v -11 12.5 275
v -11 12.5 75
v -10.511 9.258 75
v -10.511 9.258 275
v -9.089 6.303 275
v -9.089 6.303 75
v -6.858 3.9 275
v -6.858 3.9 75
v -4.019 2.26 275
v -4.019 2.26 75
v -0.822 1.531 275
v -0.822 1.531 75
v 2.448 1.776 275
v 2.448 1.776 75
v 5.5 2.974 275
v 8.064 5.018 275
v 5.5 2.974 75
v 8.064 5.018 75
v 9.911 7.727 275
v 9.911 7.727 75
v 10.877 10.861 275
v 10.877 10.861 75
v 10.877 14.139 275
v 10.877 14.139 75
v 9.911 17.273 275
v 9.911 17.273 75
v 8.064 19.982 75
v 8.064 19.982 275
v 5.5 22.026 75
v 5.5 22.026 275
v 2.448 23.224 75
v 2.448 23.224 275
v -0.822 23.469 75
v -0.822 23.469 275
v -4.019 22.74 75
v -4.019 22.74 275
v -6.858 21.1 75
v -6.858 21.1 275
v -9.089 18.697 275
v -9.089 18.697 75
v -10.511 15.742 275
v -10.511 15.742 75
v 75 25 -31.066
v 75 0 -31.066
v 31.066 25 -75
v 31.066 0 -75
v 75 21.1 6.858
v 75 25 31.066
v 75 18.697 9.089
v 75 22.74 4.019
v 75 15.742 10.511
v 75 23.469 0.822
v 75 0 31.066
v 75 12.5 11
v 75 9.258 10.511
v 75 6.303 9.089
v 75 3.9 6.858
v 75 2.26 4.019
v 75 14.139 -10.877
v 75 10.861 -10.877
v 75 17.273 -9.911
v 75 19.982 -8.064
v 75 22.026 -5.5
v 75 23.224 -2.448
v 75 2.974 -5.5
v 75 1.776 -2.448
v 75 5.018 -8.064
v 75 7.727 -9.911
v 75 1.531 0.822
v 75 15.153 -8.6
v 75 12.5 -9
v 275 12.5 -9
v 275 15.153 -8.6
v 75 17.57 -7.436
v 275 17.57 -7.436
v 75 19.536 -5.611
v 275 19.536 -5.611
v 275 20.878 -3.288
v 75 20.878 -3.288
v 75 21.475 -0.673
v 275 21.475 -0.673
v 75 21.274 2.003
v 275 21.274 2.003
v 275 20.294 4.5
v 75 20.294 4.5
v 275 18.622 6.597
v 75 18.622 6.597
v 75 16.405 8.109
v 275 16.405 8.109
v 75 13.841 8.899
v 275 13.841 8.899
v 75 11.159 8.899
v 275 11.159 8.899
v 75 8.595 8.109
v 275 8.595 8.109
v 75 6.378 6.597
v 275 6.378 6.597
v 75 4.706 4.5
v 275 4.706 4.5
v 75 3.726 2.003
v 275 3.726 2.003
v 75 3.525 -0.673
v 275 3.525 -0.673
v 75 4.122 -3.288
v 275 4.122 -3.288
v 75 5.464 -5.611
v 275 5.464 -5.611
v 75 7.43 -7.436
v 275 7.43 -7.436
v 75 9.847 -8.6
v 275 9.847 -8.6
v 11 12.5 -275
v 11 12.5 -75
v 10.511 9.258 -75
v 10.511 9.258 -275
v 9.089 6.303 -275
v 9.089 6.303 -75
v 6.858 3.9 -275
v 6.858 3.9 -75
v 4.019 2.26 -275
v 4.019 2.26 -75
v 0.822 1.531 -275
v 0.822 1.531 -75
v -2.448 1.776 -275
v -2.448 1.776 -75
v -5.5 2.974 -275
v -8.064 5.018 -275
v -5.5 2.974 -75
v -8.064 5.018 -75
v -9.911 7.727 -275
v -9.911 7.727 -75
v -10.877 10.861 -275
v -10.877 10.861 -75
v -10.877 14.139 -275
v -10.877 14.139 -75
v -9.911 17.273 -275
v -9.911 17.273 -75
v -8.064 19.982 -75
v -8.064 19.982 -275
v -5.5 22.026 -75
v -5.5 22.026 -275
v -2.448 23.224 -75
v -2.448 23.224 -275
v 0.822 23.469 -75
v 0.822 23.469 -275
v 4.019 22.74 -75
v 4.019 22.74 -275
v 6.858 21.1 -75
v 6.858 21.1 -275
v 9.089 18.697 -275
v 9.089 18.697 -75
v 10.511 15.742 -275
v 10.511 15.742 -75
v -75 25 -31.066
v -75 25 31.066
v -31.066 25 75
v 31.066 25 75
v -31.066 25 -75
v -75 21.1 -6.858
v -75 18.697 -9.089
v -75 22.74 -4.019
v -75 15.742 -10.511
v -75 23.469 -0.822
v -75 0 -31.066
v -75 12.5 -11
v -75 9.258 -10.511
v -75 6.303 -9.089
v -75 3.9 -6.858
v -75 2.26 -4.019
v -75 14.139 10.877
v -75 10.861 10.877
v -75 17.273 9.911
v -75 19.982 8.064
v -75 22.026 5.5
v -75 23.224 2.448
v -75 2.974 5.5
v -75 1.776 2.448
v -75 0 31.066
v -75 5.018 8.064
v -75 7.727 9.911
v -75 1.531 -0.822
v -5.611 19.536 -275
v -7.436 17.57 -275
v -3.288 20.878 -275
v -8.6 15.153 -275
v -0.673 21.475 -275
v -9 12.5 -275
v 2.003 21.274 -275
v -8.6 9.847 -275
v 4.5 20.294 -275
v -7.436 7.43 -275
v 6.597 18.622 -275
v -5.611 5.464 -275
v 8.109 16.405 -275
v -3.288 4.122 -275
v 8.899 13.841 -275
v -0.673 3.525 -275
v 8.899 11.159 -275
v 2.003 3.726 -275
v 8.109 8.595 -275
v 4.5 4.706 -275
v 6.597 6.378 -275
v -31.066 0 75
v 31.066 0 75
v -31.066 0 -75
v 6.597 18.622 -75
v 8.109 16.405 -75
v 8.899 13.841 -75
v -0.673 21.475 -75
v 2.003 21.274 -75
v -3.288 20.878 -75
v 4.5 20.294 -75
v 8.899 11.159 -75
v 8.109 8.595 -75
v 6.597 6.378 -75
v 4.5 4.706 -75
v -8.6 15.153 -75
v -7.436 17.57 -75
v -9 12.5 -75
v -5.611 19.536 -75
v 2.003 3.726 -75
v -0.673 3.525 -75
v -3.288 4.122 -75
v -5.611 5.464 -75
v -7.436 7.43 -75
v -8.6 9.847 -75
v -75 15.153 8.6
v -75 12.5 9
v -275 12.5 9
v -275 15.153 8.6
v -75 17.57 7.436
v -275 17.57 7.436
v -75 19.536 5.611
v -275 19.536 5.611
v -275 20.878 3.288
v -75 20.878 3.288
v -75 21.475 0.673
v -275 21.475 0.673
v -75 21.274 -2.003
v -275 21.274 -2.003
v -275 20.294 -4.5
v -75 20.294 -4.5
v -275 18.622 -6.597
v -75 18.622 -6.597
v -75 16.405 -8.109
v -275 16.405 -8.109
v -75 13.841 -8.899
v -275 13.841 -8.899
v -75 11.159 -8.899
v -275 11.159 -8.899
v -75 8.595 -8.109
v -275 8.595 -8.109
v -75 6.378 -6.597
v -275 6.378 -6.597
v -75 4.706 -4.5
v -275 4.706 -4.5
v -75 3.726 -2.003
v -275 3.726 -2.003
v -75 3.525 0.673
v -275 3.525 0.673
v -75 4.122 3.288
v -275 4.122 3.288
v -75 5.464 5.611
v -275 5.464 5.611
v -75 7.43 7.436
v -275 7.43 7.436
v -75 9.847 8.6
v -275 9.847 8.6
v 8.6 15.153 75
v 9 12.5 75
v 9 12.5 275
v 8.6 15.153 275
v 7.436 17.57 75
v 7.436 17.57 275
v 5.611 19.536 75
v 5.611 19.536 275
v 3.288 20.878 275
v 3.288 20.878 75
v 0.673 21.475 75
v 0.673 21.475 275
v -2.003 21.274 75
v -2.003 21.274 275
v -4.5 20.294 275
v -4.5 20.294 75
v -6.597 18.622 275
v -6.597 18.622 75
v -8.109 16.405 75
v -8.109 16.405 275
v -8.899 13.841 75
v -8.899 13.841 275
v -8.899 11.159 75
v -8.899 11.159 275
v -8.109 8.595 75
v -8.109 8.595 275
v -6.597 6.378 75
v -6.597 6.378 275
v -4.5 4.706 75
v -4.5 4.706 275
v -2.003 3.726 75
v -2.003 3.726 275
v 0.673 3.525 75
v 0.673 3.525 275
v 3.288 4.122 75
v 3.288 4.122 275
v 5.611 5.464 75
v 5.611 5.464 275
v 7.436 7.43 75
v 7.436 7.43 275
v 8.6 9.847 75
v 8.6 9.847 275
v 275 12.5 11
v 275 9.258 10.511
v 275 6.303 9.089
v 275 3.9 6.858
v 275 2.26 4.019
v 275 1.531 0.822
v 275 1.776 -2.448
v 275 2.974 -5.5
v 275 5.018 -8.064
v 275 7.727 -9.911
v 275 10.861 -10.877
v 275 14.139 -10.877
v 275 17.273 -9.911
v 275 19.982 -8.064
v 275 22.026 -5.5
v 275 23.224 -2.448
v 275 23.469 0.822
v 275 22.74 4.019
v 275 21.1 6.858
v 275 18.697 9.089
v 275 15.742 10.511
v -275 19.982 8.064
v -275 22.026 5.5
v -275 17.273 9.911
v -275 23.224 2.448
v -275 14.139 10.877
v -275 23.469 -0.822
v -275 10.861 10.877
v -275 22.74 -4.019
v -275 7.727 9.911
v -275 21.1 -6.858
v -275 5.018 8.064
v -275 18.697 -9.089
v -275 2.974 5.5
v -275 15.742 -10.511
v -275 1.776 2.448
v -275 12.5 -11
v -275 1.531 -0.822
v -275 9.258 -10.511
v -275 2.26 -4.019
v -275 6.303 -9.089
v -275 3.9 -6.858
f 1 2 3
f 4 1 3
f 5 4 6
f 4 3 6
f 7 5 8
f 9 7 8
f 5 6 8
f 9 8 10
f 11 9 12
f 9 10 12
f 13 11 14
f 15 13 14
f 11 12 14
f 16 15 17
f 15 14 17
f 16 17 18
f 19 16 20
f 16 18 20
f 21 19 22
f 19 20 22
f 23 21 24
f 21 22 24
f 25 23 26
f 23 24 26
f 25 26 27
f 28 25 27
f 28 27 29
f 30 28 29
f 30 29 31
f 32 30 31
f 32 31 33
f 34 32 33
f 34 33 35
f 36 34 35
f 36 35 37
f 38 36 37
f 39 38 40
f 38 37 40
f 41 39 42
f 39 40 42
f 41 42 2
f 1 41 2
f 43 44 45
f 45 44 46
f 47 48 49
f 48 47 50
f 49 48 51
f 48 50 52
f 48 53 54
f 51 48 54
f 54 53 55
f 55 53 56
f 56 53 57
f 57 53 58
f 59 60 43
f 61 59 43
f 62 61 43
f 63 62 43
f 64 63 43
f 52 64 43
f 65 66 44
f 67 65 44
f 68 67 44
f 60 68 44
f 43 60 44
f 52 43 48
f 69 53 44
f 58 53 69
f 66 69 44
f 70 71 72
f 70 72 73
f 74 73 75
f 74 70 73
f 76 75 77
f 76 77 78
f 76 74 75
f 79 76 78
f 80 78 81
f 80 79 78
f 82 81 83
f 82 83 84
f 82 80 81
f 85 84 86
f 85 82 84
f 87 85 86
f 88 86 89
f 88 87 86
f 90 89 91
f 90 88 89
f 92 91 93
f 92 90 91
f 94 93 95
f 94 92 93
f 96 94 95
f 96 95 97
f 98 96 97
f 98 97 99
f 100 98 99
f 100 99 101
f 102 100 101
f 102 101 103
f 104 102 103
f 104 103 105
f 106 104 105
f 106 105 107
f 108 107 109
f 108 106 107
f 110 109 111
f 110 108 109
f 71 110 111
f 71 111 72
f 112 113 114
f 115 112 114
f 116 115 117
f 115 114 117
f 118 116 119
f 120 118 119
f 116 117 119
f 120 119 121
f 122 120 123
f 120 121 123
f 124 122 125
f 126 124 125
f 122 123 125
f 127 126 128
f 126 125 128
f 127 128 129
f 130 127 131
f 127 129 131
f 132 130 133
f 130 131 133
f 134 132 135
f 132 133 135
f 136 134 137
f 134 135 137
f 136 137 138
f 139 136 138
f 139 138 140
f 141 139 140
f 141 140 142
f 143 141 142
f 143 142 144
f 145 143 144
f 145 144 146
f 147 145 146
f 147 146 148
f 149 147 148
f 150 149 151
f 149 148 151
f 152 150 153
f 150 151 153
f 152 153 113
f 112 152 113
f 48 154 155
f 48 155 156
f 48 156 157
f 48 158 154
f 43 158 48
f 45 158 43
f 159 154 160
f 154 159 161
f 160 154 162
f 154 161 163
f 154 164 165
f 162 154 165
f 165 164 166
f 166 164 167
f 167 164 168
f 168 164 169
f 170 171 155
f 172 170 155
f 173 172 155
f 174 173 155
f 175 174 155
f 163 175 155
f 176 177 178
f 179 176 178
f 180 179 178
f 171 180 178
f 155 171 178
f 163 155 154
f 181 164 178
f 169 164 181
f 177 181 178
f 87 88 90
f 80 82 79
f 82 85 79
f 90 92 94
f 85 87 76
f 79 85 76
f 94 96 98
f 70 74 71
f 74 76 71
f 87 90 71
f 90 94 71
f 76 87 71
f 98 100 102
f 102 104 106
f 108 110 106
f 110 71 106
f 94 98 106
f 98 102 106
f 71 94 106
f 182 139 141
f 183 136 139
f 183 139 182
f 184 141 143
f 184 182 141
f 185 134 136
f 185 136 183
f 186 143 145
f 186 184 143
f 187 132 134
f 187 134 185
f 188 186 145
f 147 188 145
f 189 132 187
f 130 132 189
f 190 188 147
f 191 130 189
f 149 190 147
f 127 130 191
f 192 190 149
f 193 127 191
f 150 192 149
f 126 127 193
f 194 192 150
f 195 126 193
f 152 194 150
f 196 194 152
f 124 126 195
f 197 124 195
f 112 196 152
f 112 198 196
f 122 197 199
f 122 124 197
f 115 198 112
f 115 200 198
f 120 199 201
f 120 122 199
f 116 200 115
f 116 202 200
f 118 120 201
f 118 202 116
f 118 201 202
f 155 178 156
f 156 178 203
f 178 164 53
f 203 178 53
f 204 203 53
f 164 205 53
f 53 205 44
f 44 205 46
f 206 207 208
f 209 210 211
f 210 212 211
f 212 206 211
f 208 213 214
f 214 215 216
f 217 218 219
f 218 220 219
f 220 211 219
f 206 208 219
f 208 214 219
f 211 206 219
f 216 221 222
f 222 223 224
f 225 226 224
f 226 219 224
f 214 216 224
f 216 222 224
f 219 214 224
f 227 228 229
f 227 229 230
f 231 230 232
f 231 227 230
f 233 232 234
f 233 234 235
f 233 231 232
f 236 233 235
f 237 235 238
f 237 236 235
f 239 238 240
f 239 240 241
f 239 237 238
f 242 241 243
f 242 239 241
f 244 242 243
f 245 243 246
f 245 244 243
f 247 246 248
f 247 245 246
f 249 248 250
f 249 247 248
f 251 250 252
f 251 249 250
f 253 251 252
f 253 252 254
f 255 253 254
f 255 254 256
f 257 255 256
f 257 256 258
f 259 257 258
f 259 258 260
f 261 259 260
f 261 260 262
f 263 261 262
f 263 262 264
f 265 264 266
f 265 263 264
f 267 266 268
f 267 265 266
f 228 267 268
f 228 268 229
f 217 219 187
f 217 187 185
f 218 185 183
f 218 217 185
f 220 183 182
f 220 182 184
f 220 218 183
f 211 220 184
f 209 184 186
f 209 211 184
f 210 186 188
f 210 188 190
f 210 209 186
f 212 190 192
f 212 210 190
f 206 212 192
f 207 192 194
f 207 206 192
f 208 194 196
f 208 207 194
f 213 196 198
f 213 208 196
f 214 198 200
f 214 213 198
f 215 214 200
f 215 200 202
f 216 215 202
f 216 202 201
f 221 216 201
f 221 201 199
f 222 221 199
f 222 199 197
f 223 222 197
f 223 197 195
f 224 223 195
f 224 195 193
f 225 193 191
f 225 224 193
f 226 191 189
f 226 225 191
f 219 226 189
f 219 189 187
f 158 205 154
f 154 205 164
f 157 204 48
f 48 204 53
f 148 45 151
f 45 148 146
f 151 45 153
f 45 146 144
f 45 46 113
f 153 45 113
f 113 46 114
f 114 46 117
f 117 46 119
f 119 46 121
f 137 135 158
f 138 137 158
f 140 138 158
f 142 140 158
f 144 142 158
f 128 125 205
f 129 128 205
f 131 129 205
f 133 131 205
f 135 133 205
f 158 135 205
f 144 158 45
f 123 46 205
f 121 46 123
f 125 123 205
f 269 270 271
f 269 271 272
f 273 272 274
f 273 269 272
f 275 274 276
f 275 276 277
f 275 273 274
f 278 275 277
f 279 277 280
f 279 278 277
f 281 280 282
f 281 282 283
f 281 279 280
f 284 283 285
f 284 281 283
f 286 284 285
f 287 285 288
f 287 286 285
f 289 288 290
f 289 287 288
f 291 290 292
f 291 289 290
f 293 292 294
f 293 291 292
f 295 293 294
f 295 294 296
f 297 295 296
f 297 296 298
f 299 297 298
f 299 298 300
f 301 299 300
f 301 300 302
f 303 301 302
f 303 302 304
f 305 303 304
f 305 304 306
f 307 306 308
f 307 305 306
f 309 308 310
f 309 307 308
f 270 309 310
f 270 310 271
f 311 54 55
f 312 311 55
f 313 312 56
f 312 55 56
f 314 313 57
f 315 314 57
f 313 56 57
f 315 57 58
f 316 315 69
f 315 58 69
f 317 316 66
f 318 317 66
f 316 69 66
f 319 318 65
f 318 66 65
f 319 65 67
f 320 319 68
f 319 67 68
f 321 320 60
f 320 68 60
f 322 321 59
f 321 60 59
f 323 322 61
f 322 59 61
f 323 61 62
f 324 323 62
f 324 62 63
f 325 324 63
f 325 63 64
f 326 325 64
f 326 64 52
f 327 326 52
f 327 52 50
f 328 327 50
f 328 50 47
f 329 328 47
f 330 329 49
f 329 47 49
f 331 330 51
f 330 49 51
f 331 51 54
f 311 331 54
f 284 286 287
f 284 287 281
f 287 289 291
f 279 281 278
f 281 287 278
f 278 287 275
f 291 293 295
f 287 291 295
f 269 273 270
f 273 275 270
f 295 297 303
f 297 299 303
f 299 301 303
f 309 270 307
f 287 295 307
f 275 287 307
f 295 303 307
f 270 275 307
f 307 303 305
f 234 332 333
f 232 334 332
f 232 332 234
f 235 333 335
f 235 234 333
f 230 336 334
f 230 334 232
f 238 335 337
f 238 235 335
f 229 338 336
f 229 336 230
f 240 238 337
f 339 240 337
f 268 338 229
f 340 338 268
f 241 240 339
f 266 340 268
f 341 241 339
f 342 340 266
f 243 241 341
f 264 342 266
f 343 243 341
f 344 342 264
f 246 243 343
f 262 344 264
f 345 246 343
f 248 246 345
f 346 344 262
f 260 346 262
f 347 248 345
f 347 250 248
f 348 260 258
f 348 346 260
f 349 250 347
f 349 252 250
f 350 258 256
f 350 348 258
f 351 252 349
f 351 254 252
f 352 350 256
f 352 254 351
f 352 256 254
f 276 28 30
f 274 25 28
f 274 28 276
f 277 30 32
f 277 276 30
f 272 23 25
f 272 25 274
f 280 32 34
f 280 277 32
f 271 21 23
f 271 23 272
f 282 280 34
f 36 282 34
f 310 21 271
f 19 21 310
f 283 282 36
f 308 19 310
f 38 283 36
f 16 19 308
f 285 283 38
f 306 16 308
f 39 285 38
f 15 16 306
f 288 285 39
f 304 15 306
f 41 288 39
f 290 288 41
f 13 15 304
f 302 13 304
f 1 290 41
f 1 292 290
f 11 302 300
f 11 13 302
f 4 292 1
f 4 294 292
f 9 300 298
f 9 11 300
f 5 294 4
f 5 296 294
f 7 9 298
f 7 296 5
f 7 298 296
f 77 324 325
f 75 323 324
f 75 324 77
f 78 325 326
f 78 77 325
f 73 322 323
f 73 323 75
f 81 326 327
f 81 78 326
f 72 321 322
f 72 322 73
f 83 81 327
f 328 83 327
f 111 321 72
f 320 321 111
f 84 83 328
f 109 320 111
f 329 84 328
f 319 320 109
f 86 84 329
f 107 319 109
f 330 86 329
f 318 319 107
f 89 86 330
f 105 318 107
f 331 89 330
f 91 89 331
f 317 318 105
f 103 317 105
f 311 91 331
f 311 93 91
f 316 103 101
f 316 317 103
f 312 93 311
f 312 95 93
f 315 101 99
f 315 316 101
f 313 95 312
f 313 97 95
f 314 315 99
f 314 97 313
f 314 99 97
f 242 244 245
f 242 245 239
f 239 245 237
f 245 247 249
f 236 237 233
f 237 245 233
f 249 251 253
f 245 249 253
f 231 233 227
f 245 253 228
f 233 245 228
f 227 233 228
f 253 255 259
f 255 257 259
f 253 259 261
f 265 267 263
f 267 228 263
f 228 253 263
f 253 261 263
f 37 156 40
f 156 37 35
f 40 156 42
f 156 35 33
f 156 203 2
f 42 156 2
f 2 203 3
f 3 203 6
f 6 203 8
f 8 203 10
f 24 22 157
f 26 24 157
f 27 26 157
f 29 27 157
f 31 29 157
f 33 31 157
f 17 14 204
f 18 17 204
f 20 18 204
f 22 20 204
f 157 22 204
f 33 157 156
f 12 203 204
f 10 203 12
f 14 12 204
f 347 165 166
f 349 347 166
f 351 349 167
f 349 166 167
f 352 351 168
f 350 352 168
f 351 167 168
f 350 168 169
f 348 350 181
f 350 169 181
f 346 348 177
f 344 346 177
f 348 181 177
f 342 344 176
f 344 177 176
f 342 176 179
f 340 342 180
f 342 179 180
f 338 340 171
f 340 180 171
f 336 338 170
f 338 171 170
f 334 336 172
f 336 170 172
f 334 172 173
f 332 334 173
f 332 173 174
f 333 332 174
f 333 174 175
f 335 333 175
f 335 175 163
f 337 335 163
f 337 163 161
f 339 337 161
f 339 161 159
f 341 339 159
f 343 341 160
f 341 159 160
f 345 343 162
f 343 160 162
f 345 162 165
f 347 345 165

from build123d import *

# Parameters (mm, degrees)
BOSS_EXTRUDE1_DEPTH = 25
SKETCH2_R           = 11
SKETCH2_R_2         = 9
BOSS_EXTRUDE2_DEPTH = 200
CIRPATTERN1_COUNT   = 4


with BuildPart() as part:
    # Sketch1 → Boss-Extrude1 (new body)
    with BuildSketch(Plane(origin=(0, 0, 0), x_dir=(1, 0, 0), z_dir=(0, 1, 0))):
        Polygon((-75, 31.066017178), (-75, -31.066017178), (-31.066017178, -75), (31.066017178, -75), (75, -31.066017178), (75, 31.066017178), (31.066017178, 75), (-31.066017178, 75), align=None)
    extrude(amount=BOSS_EXTRUDE1_DEPTH)

    # Sketch2 → Boss-Extrude2 (add)
    with BuildSketch(Plane.ZY.offset(75)):
        with Locations((0, 12.5)):
            Circle(SKETCH2_R)
        with Locations((0, 12.5)):
            Circle(SKETCH2_R_2, mode=Mode.SUBTRACT)
    boss_extrude2 = extrude(amount=BOSS_EXTRUDE2_DEPTH)

    # CirPattern1: Boss-Extrude2 ×4 about axis
    cirpattern1_axis = Axis((0, 0, 0), (0, 1, 0))
    for i in range(1, CIRPATTERN1_COUNT):
        add(boss_extrude2.rotate(cirpattern1_axis, i * 360 / CIRPATTERN1_COUNT))


solid = part.part
